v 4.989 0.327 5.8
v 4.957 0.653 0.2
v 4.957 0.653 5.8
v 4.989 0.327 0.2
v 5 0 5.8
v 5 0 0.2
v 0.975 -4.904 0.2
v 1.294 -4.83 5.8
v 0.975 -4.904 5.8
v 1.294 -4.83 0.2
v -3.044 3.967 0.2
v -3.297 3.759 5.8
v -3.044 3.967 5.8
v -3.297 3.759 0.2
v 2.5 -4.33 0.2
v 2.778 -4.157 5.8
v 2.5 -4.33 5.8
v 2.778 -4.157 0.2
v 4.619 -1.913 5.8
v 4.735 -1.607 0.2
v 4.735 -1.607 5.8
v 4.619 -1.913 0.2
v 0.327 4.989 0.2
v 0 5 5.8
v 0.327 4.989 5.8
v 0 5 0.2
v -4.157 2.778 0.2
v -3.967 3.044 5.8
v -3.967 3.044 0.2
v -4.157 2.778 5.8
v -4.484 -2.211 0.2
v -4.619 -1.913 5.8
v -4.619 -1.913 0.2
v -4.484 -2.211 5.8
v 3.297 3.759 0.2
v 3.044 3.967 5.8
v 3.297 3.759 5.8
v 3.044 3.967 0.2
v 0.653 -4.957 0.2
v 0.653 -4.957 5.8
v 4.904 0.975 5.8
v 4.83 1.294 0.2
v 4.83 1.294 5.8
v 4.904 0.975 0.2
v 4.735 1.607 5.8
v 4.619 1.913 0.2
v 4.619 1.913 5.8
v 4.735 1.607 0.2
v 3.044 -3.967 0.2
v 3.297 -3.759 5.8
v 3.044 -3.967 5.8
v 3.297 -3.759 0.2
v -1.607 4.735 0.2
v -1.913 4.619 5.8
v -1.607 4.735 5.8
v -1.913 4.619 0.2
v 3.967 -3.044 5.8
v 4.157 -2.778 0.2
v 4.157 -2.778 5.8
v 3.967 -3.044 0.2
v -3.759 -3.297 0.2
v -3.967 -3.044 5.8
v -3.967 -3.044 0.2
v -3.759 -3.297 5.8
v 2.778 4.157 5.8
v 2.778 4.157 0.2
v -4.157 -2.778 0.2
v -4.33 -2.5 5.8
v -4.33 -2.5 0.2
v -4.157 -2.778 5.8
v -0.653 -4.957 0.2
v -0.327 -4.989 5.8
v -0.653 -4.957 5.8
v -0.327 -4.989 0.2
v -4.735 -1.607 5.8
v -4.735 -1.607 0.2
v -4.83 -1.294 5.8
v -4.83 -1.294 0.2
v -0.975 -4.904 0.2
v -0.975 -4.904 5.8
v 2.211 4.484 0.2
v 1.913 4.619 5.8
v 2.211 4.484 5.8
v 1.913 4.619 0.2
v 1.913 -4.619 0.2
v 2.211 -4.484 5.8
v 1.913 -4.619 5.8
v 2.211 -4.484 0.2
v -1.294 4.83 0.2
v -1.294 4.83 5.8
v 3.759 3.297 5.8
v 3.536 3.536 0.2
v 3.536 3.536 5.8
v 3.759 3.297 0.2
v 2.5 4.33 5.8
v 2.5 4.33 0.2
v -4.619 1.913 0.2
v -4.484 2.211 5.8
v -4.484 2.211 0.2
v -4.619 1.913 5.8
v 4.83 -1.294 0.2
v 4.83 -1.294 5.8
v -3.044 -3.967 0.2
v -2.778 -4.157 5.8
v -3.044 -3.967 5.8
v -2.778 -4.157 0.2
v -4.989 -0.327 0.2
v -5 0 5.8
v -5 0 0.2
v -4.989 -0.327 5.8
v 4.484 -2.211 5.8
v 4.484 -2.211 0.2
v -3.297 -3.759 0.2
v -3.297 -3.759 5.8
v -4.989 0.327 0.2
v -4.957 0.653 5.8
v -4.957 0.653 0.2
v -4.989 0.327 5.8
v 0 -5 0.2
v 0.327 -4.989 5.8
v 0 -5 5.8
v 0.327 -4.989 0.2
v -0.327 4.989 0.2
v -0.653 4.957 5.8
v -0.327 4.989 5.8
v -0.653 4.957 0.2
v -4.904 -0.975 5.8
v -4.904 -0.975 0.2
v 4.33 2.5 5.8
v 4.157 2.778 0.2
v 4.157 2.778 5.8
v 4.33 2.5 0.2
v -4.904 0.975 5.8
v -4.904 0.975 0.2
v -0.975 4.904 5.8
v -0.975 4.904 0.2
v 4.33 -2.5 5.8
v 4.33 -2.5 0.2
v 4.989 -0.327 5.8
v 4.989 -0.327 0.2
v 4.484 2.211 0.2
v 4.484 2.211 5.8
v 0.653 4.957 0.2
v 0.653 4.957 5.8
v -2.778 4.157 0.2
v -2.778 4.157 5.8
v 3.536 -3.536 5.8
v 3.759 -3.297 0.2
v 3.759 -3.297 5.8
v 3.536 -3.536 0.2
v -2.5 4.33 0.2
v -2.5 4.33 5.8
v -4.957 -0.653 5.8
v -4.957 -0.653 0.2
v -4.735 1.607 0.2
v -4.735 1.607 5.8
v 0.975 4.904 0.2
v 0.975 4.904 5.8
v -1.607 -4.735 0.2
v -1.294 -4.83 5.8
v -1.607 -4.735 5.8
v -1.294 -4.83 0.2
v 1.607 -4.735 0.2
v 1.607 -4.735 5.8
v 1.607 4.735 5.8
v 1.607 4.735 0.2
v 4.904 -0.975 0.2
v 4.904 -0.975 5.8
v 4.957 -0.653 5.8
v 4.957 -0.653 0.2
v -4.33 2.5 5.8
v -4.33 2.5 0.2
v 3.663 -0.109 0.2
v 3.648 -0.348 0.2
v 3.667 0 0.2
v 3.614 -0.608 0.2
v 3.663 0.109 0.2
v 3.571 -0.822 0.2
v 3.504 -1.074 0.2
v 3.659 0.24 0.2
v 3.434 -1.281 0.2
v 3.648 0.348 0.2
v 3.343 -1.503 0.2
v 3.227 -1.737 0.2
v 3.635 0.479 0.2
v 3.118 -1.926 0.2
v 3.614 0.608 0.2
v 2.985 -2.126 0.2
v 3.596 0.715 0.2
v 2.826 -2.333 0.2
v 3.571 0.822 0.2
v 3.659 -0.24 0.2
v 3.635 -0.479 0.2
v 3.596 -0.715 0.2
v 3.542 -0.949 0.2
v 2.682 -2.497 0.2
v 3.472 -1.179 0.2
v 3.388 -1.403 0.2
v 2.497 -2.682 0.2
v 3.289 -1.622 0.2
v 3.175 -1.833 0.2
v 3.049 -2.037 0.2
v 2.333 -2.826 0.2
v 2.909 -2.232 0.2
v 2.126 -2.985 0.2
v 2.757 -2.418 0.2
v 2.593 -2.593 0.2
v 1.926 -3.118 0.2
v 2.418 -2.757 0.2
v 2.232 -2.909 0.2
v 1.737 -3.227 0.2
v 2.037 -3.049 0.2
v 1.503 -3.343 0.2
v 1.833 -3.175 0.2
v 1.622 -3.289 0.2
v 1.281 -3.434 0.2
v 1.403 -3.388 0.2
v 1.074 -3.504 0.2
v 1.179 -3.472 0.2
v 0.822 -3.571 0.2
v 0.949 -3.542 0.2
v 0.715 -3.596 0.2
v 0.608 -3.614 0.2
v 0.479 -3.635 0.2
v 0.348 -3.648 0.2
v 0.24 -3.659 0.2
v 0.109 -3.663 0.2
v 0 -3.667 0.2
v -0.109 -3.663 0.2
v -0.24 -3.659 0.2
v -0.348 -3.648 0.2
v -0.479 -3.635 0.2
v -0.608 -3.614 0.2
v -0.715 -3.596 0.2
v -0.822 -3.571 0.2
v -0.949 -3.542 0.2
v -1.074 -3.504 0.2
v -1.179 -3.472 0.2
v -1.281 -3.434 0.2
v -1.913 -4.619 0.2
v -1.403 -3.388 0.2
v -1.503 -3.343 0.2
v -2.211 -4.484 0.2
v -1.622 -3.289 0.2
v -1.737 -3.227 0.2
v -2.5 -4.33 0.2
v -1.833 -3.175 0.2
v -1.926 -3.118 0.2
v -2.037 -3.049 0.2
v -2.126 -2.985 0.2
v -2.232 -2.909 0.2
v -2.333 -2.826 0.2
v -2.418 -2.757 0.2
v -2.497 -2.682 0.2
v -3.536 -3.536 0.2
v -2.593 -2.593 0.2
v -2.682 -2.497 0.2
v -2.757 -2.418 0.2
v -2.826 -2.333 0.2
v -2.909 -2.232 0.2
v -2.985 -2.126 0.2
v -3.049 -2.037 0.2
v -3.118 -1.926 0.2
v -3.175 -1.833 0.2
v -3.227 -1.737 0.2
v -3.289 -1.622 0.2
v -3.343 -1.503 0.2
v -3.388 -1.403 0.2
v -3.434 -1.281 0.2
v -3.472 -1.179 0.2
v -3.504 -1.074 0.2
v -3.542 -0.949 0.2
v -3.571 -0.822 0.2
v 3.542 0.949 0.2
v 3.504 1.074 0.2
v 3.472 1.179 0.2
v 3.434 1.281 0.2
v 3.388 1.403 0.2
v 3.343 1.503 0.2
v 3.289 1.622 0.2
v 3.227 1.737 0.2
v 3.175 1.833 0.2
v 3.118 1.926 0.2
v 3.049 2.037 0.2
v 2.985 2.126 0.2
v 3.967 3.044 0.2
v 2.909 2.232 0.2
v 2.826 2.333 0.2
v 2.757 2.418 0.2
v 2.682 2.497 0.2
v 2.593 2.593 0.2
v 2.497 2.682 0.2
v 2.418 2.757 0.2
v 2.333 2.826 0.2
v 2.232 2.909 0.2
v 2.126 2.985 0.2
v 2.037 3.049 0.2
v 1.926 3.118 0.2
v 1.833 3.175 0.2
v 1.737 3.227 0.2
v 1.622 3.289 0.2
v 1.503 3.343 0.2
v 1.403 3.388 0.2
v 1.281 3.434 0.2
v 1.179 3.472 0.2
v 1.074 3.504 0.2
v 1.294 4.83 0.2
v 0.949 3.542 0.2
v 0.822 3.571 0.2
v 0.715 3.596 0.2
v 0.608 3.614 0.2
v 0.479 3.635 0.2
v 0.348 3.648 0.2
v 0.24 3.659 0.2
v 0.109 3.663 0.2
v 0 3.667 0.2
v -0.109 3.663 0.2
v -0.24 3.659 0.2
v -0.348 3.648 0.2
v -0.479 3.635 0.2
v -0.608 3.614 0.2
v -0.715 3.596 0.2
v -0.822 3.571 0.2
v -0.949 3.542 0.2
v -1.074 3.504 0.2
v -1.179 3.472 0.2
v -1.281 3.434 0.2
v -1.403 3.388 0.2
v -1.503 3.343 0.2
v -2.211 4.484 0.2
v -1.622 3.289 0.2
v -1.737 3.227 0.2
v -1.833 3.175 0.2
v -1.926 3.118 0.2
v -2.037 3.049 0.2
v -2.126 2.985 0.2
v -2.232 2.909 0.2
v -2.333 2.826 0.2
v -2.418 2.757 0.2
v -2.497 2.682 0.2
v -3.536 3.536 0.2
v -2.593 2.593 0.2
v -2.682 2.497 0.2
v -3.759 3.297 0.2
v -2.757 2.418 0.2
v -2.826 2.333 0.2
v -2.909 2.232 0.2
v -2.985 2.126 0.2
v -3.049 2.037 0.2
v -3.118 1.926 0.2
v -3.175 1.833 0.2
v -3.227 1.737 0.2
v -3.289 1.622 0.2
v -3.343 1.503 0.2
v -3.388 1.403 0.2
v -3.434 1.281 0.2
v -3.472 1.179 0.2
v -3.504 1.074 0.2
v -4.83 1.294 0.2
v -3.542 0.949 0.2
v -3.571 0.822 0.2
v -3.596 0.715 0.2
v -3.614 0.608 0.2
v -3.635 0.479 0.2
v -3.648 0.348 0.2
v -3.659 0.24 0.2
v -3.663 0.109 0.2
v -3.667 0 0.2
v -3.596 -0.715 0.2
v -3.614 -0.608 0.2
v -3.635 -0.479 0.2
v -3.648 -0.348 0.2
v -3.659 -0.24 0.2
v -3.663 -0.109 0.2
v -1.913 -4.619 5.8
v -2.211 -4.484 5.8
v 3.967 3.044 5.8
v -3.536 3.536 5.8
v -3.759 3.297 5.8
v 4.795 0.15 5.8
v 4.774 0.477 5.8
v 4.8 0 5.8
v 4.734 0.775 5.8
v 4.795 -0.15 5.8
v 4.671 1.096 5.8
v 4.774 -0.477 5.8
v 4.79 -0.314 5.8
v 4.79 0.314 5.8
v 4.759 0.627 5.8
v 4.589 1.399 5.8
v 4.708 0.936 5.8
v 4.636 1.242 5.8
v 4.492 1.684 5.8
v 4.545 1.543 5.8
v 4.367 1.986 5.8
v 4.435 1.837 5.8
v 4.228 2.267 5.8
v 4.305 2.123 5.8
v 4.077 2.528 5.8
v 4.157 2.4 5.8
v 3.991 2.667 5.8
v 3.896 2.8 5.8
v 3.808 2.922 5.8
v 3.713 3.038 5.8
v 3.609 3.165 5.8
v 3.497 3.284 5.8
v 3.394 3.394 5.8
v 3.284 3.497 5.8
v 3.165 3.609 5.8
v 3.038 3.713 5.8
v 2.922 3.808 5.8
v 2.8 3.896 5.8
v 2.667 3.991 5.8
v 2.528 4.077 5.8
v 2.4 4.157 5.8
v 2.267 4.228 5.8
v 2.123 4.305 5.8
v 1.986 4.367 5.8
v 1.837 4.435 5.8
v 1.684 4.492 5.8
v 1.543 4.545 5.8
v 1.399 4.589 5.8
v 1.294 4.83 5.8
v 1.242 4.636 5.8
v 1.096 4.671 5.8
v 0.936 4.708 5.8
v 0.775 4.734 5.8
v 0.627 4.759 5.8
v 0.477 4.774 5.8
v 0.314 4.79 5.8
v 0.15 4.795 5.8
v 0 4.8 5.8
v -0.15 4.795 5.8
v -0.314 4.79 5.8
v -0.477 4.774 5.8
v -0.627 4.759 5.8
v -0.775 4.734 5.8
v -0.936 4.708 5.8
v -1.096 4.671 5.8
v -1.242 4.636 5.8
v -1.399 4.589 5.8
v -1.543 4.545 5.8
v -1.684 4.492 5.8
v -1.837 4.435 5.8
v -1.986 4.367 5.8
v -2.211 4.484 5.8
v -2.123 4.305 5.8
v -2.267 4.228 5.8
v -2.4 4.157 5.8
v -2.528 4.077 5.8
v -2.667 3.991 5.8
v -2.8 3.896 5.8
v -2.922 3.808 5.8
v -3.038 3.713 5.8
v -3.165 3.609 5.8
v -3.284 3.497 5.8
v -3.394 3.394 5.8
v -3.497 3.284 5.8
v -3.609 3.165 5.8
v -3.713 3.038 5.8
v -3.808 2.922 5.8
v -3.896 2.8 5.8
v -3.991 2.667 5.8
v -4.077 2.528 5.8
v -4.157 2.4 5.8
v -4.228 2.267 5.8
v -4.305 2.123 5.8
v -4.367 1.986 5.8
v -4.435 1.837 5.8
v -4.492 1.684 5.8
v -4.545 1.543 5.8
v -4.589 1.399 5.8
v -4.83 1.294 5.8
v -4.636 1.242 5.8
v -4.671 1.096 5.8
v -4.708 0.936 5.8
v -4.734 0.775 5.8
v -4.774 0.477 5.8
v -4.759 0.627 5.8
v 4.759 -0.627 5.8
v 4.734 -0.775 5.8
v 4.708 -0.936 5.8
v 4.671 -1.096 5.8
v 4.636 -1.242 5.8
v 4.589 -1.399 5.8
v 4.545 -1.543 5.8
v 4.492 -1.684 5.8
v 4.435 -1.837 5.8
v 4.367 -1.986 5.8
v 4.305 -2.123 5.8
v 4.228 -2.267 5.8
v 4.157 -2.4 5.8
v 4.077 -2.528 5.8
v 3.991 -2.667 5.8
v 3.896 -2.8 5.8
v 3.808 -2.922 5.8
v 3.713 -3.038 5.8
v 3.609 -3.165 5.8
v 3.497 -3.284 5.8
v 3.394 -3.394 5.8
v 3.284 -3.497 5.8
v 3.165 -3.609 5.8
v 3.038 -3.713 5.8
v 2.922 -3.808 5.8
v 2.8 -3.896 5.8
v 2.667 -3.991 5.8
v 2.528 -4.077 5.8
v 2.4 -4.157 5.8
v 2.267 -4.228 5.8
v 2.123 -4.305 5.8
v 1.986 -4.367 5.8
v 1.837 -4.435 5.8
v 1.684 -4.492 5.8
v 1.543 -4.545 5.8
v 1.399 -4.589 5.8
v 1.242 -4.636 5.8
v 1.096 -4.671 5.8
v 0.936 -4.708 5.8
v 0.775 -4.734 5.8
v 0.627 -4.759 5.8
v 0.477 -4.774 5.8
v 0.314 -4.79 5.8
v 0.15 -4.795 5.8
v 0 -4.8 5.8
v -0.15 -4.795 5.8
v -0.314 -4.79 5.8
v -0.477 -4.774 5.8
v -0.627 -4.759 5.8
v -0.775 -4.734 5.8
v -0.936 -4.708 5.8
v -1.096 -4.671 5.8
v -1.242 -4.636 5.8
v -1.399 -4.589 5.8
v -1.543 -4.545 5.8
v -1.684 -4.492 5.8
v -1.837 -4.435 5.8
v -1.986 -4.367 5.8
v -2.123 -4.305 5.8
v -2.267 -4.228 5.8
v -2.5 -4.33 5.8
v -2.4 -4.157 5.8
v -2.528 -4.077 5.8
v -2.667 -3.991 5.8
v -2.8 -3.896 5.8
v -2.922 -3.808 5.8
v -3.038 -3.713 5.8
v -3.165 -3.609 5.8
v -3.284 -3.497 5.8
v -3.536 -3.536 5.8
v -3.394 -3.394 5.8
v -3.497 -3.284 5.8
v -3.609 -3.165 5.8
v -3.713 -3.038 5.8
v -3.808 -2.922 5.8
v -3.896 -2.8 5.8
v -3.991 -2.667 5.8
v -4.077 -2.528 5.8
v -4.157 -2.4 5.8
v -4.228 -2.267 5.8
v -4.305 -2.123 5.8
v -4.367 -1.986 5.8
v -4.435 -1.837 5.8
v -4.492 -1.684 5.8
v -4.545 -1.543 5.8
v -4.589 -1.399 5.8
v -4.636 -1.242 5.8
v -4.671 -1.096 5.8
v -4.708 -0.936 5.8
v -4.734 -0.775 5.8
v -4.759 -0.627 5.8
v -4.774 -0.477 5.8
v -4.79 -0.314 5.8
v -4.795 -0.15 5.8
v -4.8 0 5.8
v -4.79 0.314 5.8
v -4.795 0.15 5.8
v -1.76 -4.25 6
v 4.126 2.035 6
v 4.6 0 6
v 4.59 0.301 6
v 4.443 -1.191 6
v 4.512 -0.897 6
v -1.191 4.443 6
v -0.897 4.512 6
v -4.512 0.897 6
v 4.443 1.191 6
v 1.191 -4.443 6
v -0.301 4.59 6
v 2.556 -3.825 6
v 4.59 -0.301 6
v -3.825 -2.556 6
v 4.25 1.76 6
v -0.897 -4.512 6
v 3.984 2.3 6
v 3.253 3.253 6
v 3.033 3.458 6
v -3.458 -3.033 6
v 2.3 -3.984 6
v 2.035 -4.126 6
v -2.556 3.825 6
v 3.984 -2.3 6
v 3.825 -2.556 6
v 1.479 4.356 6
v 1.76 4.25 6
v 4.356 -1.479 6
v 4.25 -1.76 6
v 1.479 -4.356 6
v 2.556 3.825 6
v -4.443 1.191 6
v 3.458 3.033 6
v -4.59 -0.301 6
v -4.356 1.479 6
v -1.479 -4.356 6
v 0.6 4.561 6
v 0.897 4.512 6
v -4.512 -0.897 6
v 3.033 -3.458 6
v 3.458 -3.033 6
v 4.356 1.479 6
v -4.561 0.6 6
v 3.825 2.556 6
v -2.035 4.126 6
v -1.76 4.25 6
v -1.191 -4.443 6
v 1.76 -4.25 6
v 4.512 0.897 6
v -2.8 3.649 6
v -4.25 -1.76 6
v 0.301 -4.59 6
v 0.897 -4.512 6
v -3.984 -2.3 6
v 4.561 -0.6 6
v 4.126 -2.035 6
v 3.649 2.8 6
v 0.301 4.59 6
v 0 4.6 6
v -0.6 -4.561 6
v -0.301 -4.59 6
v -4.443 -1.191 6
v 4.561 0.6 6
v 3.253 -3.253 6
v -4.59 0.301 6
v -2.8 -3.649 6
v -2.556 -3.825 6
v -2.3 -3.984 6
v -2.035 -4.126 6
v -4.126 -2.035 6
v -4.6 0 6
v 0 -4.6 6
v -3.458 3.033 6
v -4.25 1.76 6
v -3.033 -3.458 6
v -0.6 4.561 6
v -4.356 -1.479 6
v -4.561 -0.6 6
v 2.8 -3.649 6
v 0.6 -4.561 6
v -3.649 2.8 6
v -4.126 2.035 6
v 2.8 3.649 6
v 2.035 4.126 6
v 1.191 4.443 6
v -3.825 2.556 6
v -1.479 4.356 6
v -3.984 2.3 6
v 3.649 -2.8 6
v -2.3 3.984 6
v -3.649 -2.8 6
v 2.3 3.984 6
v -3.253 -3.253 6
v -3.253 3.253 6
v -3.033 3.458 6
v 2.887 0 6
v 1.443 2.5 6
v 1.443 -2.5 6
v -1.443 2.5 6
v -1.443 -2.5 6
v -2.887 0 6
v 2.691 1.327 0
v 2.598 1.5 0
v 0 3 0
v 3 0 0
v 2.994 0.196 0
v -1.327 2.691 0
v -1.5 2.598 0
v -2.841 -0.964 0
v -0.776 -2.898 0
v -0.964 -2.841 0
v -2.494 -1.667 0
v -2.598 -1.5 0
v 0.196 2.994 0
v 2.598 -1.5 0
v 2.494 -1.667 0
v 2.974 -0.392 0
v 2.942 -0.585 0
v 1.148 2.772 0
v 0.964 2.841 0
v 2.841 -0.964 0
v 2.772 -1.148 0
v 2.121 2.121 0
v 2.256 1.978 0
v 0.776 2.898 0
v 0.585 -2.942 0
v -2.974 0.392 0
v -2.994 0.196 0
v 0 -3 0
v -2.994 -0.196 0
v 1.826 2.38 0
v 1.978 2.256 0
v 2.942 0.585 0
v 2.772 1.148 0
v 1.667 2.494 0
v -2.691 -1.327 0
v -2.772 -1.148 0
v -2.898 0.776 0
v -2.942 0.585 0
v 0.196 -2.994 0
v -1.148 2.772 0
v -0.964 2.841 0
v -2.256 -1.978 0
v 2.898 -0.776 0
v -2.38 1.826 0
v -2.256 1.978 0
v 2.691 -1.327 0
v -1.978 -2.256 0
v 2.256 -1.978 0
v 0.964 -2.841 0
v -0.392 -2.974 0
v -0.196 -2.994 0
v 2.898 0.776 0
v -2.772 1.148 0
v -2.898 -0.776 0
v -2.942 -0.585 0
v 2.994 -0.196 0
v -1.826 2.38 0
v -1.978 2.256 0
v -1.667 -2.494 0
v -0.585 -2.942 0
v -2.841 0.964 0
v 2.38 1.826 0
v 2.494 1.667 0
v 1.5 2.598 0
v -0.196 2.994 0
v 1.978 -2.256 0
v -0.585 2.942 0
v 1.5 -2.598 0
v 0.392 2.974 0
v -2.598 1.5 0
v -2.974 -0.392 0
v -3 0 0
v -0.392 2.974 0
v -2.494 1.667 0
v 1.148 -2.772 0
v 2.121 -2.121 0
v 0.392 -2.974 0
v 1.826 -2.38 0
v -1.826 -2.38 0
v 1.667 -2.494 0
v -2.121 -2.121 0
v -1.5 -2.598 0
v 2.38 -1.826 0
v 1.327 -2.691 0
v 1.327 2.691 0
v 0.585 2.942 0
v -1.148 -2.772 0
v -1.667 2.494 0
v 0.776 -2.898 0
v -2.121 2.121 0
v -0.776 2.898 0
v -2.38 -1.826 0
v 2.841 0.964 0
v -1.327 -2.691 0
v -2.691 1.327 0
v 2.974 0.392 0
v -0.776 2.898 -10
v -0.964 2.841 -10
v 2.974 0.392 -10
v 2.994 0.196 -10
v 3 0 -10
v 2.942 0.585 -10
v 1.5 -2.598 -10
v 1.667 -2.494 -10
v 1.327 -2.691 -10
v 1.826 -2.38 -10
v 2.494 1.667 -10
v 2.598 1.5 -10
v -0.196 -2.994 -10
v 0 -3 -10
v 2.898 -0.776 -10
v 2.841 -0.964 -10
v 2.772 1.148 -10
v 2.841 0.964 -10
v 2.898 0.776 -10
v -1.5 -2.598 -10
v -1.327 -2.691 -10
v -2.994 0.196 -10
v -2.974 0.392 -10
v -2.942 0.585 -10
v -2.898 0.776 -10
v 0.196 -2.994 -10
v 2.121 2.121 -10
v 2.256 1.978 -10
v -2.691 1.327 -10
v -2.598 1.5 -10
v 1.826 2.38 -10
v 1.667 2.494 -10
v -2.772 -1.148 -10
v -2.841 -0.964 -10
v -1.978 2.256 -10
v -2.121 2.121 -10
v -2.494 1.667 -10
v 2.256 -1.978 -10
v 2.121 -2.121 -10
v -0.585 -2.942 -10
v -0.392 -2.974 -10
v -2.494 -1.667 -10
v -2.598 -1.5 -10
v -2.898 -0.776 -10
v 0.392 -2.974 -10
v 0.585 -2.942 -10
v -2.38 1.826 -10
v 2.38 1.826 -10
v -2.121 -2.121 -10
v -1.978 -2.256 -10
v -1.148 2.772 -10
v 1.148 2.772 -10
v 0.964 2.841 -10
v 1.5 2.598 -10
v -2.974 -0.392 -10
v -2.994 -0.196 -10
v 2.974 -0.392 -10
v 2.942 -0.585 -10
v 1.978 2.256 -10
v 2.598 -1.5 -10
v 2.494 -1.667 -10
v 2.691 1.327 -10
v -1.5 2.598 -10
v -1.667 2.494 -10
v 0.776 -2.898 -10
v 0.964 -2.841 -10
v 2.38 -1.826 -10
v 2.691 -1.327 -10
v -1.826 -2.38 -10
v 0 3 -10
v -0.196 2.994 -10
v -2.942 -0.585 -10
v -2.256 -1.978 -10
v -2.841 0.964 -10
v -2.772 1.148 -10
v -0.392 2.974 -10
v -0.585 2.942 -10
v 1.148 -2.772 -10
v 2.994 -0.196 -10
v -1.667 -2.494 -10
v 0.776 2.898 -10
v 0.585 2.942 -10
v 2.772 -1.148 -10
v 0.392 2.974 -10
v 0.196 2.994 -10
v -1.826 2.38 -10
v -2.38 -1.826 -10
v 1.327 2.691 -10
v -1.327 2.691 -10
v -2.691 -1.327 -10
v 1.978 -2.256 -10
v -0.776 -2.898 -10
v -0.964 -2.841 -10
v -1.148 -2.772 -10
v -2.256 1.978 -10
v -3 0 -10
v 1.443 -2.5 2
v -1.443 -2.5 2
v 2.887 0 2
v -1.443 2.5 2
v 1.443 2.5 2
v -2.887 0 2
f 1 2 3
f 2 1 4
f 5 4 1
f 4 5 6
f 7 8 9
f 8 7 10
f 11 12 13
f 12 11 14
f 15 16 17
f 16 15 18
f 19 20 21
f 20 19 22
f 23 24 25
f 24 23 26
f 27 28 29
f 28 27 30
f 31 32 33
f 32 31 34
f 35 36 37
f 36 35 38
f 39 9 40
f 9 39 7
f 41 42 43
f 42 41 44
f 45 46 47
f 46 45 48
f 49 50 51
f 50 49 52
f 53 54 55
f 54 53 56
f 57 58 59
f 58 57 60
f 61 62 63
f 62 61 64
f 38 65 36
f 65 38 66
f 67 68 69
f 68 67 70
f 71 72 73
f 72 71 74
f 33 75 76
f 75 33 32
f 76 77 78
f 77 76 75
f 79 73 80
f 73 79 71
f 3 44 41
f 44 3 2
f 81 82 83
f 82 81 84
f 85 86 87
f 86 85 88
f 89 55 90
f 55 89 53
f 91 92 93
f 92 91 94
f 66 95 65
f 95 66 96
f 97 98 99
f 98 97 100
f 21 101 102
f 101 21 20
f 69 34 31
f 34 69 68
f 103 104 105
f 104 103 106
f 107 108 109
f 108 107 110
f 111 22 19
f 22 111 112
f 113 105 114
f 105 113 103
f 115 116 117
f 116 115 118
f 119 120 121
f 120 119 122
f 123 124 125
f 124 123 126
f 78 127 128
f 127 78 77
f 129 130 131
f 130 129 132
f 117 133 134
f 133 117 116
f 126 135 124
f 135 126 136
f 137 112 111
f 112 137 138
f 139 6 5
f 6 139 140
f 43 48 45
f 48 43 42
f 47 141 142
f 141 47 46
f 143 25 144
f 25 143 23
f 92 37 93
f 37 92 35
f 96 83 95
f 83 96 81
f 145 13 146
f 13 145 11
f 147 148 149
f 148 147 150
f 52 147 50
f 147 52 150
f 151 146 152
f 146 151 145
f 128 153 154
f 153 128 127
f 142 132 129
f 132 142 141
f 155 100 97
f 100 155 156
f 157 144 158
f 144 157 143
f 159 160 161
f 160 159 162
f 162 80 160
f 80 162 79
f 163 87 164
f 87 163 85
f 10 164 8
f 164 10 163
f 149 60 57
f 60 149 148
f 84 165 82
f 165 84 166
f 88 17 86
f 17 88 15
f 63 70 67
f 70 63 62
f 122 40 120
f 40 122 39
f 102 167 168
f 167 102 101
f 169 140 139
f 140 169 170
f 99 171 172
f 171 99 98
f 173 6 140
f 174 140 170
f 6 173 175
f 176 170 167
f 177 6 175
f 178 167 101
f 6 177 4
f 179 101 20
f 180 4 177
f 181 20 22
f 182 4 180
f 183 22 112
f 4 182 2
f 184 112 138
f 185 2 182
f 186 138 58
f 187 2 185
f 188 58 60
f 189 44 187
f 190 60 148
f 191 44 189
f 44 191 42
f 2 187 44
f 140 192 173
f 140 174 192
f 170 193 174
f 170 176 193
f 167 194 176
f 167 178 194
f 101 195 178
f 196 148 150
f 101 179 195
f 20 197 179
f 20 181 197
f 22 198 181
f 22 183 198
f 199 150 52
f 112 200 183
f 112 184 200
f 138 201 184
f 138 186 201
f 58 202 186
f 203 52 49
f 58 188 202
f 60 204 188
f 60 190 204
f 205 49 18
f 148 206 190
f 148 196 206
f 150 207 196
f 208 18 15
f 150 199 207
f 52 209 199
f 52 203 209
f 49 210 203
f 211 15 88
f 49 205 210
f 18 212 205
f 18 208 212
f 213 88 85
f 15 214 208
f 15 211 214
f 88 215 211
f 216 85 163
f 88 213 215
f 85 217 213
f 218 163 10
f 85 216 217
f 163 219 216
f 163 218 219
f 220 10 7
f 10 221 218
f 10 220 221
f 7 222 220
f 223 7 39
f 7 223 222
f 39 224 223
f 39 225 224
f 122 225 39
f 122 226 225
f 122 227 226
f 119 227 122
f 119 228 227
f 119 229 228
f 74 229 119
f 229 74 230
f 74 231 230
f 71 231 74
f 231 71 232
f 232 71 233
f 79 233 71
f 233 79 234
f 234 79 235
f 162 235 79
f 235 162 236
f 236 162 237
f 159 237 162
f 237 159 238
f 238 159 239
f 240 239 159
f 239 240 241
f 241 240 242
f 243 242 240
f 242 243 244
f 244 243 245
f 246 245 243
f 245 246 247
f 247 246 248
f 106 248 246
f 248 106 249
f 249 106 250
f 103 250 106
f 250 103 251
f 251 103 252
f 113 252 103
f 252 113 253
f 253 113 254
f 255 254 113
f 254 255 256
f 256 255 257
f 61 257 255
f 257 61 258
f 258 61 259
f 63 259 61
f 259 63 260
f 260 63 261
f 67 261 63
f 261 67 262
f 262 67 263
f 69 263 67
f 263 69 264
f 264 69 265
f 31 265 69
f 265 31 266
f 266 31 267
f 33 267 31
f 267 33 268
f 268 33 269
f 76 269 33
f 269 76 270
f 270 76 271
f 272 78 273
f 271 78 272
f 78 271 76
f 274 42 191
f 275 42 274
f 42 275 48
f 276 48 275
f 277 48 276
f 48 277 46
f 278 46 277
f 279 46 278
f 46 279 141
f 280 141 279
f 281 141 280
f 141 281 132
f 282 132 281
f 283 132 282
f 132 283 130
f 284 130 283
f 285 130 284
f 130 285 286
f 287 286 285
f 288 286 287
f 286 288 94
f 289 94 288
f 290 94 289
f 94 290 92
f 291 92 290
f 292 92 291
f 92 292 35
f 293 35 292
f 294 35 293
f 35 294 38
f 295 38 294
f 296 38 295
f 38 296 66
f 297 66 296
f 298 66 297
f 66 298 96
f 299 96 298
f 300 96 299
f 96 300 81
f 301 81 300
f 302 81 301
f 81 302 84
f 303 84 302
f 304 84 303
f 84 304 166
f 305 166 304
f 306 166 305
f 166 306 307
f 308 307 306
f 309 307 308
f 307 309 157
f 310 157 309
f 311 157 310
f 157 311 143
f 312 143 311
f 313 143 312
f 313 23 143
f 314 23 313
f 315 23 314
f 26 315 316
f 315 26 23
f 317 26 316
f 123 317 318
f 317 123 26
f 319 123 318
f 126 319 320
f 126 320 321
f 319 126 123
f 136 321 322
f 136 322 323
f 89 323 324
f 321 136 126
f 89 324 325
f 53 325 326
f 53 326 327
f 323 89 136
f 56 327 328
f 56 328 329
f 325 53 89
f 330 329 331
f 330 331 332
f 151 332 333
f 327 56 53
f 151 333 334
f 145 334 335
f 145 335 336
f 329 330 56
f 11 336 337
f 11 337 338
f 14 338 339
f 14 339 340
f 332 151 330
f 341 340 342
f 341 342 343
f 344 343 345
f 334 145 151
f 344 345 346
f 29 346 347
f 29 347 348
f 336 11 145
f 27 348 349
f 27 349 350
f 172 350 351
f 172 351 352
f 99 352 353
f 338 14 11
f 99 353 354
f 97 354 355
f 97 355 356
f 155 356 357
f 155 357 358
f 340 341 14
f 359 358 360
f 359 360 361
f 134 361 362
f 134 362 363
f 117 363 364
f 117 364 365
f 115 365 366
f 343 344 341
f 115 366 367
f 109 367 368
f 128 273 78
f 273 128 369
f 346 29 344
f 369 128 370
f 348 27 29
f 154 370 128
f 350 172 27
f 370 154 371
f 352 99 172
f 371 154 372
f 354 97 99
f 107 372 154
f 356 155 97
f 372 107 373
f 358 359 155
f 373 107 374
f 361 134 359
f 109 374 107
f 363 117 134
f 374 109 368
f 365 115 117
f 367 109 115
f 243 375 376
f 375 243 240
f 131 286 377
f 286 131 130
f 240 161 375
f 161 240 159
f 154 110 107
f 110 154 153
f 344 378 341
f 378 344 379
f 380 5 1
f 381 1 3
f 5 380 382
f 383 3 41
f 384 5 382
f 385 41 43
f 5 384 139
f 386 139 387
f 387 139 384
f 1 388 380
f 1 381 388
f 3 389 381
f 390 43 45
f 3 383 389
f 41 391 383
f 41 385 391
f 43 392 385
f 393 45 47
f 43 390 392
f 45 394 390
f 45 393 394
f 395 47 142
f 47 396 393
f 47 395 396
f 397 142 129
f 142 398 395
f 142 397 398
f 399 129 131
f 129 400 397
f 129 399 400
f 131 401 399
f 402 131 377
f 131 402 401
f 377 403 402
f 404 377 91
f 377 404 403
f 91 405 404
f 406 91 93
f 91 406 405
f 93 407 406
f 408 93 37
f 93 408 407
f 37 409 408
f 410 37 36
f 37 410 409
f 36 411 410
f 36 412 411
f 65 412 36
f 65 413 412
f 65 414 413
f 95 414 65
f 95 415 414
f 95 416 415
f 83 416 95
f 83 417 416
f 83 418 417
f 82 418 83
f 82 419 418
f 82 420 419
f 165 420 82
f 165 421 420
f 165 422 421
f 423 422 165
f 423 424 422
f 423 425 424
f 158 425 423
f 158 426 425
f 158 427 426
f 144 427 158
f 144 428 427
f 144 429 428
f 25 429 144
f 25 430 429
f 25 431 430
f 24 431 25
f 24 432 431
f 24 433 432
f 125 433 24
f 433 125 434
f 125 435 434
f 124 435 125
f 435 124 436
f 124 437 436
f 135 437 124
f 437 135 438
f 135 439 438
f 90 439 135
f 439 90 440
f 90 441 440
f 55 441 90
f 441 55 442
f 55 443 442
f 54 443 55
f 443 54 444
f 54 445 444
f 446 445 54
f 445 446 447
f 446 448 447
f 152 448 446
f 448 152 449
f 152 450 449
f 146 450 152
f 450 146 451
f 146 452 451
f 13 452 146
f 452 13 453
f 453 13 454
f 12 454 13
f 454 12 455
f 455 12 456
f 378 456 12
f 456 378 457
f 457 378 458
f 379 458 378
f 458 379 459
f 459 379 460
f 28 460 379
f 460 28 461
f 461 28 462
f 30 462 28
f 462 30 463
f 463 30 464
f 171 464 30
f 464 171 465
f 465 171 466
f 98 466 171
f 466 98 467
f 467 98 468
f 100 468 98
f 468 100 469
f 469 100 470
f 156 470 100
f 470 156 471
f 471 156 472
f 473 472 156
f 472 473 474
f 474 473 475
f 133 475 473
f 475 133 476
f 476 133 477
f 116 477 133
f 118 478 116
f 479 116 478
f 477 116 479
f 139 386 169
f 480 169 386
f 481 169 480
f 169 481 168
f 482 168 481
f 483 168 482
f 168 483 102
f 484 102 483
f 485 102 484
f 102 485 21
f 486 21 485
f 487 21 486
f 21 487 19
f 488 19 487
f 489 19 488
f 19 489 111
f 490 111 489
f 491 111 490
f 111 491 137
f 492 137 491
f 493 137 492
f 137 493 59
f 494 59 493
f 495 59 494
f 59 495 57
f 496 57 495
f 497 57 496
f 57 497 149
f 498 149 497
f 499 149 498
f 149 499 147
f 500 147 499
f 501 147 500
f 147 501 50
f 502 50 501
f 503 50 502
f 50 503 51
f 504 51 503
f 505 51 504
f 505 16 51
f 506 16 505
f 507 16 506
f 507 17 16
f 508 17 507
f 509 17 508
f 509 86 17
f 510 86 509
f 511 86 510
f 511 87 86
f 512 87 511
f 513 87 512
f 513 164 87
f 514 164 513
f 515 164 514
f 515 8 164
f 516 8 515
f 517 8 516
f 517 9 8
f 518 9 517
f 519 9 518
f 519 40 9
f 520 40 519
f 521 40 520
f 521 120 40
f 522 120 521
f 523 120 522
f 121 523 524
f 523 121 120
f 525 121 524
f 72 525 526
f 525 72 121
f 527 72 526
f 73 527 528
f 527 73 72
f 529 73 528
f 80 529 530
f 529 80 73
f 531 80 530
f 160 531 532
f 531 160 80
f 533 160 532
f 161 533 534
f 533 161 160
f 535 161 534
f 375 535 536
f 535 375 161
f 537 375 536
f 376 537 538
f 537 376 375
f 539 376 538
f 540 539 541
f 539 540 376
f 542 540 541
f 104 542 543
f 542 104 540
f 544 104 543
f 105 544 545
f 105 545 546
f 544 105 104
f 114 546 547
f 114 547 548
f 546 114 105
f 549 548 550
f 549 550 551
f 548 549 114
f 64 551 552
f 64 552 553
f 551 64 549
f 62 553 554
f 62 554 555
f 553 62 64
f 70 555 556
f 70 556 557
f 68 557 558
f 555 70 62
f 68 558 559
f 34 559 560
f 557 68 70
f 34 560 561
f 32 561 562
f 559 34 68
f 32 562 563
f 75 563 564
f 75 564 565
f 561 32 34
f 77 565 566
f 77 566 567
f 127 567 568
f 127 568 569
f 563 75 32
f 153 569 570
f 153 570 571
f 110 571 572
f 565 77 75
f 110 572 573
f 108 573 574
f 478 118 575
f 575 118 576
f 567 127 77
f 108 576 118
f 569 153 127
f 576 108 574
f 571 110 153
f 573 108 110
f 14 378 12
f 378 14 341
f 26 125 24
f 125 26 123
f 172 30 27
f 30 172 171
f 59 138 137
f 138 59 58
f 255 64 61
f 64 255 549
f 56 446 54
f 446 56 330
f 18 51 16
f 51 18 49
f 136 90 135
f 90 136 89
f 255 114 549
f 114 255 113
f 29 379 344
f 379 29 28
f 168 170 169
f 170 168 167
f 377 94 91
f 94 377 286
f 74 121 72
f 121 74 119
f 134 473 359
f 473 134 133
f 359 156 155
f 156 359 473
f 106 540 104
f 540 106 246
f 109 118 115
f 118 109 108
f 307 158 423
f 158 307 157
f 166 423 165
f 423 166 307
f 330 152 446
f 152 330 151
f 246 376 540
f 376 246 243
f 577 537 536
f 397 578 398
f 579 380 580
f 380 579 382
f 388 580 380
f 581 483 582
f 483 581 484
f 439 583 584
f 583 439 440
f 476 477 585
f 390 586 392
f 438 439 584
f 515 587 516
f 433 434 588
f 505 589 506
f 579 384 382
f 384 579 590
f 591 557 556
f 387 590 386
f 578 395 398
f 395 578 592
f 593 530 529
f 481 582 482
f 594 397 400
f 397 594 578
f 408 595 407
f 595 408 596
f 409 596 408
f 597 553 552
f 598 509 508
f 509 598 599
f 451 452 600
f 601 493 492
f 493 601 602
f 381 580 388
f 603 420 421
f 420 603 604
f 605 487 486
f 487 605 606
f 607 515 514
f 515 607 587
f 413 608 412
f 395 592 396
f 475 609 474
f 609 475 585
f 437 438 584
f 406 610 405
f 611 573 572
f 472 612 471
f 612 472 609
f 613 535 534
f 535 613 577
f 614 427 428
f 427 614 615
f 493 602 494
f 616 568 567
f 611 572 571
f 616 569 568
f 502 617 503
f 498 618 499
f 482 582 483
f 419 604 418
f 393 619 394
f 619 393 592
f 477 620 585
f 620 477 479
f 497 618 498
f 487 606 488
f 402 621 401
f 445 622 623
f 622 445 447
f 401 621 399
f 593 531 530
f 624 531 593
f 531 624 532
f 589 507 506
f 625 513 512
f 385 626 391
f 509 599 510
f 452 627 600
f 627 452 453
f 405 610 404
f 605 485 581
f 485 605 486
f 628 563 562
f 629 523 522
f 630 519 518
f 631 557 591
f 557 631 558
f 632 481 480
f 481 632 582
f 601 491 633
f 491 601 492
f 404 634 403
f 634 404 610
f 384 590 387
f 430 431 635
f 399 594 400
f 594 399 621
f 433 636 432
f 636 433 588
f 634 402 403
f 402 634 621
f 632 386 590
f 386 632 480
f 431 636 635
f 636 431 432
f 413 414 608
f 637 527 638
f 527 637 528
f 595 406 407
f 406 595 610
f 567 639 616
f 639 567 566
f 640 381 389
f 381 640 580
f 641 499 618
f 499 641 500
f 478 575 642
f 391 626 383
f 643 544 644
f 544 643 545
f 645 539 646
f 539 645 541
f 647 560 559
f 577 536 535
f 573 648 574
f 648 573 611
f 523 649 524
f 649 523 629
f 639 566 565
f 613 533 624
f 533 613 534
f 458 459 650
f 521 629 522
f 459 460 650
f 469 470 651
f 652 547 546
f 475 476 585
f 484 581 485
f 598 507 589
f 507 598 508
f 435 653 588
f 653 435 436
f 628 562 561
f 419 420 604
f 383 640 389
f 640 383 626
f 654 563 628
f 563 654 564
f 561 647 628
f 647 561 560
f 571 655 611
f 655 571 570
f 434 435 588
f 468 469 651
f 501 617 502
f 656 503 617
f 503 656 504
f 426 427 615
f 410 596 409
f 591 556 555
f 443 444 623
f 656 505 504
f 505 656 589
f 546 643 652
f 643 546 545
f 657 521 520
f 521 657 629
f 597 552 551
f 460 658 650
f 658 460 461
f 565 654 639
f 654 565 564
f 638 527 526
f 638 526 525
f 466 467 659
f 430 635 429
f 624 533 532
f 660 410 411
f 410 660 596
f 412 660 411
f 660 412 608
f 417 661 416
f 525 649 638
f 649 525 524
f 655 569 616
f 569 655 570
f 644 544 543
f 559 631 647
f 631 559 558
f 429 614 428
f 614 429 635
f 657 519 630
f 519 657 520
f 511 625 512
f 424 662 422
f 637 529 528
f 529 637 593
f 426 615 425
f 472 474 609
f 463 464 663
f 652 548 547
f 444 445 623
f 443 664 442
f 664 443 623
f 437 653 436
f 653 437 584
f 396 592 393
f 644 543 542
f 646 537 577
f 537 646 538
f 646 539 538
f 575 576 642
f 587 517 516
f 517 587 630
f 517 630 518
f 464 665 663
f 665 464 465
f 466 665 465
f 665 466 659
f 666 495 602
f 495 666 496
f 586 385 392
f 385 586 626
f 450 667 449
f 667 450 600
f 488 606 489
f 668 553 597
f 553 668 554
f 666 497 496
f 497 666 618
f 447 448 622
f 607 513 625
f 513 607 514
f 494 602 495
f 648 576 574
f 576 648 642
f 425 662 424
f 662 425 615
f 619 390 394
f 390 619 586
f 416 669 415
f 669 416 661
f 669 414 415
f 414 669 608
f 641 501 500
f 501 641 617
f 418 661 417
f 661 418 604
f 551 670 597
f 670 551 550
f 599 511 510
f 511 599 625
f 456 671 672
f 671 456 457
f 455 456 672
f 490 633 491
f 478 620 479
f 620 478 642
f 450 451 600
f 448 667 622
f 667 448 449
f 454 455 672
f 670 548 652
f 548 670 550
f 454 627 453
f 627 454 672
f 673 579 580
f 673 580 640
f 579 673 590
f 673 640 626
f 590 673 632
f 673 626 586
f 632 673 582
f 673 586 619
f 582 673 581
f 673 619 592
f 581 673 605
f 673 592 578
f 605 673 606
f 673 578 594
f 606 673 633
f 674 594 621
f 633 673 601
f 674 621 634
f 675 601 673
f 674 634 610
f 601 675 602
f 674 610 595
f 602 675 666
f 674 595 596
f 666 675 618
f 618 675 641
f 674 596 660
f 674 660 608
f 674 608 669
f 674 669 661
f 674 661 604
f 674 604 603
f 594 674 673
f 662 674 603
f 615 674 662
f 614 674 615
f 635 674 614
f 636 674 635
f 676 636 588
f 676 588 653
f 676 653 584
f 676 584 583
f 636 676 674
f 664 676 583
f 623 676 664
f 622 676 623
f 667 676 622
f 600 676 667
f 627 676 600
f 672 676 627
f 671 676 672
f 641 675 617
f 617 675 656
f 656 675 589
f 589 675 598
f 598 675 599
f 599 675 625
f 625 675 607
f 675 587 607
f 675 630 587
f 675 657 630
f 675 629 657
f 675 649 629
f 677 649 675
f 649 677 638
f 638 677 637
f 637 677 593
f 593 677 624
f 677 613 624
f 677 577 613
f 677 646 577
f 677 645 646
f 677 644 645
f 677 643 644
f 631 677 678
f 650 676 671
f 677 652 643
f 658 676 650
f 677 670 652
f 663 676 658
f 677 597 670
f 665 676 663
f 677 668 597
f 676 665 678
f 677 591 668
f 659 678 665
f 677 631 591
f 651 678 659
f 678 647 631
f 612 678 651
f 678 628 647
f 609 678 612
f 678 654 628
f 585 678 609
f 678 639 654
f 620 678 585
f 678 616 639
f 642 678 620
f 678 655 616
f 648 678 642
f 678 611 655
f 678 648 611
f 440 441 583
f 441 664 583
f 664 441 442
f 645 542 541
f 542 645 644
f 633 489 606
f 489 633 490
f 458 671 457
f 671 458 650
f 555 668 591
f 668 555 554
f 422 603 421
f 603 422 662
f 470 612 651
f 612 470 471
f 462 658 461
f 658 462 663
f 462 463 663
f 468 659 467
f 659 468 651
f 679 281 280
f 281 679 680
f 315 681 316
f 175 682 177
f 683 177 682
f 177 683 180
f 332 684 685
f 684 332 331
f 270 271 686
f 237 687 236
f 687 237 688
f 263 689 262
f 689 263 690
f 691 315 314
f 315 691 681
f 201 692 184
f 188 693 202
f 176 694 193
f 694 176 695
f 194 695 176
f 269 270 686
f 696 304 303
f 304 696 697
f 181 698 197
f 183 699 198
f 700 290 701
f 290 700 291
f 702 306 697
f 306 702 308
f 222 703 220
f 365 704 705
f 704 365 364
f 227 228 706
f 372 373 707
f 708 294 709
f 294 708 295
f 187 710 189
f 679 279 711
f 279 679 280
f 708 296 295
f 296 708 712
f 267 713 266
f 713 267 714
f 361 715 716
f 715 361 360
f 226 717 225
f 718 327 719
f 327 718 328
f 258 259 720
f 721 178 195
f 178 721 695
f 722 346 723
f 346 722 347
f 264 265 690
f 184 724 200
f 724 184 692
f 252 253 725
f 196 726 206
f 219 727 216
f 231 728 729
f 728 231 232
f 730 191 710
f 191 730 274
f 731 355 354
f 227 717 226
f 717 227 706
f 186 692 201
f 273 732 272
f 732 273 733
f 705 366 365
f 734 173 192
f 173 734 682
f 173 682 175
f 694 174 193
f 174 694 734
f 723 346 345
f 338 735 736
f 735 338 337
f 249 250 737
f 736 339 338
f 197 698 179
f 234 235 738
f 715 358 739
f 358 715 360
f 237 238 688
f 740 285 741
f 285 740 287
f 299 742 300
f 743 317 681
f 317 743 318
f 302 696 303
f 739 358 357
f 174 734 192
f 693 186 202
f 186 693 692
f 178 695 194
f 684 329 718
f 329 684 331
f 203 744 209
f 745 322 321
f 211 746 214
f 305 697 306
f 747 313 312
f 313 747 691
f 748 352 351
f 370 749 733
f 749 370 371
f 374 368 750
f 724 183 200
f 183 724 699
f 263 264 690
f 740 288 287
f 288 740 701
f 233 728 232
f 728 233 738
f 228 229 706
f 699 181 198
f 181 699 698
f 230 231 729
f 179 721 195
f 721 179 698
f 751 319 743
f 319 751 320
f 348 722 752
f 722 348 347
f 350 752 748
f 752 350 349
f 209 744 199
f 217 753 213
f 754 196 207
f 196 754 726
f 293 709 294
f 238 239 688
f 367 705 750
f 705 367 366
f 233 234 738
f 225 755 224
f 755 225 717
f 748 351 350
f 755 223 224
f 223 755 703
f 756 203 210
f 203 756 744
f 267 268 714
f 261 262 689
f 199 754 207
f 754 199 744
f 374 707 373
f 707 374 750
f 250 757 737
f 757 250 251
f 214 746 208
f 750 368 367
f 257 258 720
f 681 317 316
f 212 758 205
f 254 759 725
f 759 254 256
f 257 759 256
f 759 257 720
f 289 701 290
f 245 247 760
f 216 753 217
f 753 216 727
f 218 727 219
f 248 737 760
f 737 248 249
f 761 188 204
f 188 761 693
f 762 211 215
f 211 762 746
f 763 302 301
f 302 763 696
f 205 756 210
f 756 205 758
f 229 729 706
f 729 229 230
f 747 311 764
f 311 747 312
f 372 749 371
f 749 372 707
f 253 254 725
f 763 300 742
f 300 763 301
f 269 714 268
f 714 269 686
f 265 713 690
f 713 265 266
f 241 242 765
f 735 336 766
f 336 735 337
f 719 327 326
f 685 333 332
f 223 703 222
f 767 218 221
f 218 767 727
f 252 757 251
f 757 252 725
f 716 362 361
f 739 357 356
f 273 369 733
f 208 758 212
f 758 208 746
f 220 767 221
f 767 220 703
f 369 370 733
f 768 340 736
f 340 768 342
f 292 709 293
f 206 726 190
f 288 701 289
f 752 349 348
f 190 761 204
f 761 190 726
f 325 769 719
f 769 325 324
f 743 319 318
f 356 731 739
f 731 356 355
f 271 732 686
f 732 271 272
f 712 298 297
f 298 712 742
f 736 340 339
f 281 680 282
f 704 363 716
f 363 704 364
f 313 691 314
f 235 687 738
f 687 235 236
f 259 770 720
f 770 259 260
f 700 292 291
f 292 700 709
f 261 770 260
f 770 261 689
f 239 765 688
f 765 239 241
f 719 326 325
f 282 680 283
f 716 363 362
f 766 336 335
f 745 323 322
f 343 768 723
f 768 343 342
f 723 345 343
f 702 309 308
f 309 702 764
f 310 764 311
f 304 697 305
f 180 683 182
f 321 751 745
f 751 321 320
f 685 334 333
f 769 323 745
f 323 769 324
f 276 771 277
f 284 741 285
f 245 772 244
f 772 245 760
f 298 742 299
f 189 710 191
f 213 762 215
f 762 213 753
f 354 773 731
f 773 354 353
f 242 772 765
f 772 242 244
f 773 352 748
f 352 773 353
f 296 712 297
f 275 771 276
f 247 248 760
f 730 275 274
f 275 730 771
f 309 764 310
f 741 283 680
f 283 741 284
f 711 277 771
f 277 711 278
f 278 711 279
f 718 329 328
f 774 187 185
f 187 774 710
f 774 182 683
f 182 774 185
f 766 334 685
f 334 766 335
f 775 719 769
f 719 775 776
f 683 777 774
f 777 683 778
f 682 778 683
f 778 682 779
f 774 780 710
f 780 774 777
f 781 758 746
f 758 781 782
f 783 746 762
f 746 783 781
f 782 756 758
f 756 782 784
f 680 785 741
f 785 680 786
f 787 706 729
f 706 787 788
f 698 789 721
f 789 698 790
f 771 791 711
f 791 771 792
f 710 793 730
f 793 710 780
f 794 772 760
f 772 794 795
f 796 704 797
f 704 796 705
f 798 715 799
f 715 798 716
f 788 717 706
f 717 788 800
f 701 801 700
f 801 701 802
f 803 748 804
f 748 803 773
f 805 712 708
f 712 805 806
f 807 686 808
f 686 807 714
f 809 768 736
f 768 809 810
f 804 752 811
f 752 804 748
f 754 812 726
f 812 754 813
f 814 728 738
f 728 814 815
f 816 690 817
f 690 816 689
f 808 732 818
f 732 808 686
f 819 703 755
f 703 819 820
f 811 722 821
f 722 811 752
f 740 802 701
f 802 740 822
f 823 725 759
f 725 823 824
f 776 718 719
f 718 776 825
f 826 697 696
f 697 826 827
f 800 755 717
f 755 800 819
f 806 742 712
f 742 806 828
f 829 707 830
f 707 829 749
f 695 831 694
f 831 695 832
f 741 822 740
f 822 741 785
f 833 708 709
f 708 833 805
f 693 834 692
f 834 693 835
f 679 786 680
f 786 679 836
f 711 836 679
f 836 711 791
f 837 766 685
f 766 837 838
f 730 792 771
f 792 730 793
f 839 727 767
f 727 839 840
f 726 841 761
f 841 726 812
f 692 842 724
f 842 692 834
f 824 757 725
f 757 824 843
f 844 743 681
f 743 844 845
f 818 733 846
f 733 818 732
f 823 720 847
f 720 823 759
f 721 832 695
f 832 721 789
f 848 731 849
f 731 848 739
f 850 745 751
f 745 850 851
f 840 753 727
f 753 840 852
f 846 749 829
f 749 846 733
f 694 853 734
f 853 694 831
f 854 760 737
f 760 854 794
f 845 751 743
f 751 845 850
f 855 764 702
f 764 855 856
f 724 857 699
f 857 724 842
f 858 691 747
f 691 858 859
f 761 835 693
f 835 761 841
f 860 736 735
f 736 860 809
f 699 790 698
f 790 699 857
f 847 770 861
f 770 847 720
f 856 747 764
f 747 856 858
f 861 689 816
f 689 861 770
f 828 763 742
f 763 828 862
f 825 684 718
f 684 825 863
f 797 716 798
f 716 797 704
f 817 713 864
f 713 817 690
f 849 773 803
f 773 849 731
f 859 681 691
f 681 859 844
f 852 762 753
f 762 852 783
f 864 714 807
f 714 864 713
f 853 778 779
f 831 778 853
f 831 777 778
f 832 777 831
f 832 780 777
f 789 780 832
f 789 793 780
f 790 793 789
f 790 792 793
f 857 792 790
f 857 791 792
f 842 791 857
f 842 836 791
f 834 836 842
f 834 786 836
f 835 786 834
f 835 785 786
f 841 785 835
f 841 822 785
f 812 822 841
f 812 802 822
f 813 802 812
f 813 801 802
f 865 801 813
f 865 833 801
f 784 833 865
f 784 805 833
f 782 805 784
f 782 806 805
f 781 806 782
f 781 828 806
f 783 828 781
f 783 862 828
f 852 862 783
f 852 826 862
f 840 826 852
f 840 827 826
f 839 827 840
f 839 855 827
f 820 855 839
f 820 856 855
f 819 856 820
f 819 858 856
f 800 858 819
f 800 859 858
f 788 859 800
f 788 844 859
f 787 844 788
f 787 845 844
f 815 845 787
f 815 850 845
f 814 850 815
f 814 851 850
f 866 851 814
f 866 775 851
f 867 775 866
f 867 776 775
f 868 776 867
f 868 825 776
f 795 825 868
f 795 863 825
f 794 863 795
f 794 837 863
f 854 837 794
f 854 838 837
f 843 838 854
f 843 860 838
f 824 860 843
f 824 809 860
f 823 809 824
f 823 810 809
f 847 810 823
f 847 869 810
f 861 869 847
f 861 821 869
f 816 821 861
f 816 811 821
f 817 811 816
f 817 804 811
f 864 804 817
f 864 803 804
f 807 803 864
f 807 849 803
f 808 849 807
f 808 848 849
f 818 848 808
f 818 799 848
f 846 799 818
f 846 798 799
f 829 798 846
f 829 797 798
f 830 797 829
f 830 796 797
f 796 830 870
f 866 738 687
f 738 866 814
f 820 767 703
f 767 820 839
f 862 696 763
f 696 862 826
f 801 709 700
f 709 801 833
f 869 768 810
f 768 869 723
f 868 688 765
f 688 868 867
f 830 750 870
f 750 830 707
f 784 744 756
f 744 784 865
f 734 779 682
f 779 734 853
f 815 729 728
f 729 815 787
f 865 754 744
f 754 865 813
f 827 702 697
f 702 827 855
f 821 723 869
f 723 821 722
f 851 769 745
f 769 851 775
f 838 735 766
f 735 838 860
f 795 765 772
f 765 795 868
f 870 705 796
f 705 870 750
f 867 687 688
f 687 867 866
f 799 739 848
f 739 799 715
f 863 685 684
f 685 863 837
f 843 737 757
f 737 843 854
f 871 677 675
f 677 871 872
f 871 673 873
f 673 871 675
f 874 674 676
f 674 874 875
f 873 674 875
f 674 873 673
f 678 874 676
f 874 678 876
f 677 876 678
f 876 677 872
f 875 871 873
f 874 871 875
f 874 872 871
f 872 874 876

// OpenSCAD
// Socket Head Cap Screw (M6x10) - single connected solid
// Requested: shaft Ø6.0, head Ø10.0, head height 6.0, length under head 10.0

$fn = 96;

// Parameters (mm)
shaft_diameter_mm      = 6.0;
length_under_head_mm   = 10.0;

head_diameter_mm       = 10.0;
head_height_mm         = 6.0;

// Typical M6 socket (can be adjusted)
socket_hex_af_mm       = 5.0;   // across flats
socket_depth_mm        = 4.0;

// Small edge breaks
top_edge_chamfer_mm    = 0.4;
under_head_chamfer_mm  = 0.6;
tip_chamfer_mm         = 0.8;

// Robust overlap for boolean ops
eps = 0.02;

// Helpers
function hex_circumradius_from_af(af) = (af/2)/cos(30);

module hex_prism(h, af, center=false) {
    cylinder(h=h, r=hex_circumradius_from_af(af), $fn=6, center=center);
}

module socket_head_cap_screw() {
    r_shaft = shaft_diameter_mm/2;
    r_head  = head_diameter_mm/2;

    // Coordinate system:
    // z=0 at underside of head (bearing surface)
    // head extends to +head_height_mm
    // shank extends to -length_under_head_mm
    difference() {
        union() {
            // Head (with slight top chamfer)
            // Main head body
            translate([0,0, head_height_mm/2])
                cylinder(h=head_height_mm - top_edge_chamfer_mm, r=r_head, center=true);

            // Top chamfer ring
            translate([0,0, head_height_mm - top_edge_chamfer_mm/2])
                cylinder(h=top_edge_chamfer_mm, r1=r_head, r2=max(r_head - top_edge_chamfer_mm, 0.01), center=true);

            // Under-head chamfer (connects head to shank)
            translate([0,0, under_head_chamfer_mm/2])
                cylinder(h=under_head_chamfer_mm, r1=r_shaft, r2=r_head, center=true);

            // Shank (length under head)
            translate([0,0, -length_under_head_mm/2])
                cylinder(h=length_under_head_mm, r=r_shaft, center=true);

            // Tip chamfer
            translate([0,0, -length_under_head_mm + tip_chamfer_mm/2])
                cylinder(h=tip_chamfer_mm, r1=max(r_shaft - tip_chamfer_mm, 0.01), r2=r_shaft, center=true);
        }

        // Hex socket recess (cut from top)
        // Place so its top is flush with head top surface.
        translate([0,0, head_height_mm - socket_depth_mm/2 + eps])
            hex_prism(h=socket_depth_mm + 2*eps, af=socket_hex_af_mm, center=true);
    }
}

socket_head_cap_screw();
